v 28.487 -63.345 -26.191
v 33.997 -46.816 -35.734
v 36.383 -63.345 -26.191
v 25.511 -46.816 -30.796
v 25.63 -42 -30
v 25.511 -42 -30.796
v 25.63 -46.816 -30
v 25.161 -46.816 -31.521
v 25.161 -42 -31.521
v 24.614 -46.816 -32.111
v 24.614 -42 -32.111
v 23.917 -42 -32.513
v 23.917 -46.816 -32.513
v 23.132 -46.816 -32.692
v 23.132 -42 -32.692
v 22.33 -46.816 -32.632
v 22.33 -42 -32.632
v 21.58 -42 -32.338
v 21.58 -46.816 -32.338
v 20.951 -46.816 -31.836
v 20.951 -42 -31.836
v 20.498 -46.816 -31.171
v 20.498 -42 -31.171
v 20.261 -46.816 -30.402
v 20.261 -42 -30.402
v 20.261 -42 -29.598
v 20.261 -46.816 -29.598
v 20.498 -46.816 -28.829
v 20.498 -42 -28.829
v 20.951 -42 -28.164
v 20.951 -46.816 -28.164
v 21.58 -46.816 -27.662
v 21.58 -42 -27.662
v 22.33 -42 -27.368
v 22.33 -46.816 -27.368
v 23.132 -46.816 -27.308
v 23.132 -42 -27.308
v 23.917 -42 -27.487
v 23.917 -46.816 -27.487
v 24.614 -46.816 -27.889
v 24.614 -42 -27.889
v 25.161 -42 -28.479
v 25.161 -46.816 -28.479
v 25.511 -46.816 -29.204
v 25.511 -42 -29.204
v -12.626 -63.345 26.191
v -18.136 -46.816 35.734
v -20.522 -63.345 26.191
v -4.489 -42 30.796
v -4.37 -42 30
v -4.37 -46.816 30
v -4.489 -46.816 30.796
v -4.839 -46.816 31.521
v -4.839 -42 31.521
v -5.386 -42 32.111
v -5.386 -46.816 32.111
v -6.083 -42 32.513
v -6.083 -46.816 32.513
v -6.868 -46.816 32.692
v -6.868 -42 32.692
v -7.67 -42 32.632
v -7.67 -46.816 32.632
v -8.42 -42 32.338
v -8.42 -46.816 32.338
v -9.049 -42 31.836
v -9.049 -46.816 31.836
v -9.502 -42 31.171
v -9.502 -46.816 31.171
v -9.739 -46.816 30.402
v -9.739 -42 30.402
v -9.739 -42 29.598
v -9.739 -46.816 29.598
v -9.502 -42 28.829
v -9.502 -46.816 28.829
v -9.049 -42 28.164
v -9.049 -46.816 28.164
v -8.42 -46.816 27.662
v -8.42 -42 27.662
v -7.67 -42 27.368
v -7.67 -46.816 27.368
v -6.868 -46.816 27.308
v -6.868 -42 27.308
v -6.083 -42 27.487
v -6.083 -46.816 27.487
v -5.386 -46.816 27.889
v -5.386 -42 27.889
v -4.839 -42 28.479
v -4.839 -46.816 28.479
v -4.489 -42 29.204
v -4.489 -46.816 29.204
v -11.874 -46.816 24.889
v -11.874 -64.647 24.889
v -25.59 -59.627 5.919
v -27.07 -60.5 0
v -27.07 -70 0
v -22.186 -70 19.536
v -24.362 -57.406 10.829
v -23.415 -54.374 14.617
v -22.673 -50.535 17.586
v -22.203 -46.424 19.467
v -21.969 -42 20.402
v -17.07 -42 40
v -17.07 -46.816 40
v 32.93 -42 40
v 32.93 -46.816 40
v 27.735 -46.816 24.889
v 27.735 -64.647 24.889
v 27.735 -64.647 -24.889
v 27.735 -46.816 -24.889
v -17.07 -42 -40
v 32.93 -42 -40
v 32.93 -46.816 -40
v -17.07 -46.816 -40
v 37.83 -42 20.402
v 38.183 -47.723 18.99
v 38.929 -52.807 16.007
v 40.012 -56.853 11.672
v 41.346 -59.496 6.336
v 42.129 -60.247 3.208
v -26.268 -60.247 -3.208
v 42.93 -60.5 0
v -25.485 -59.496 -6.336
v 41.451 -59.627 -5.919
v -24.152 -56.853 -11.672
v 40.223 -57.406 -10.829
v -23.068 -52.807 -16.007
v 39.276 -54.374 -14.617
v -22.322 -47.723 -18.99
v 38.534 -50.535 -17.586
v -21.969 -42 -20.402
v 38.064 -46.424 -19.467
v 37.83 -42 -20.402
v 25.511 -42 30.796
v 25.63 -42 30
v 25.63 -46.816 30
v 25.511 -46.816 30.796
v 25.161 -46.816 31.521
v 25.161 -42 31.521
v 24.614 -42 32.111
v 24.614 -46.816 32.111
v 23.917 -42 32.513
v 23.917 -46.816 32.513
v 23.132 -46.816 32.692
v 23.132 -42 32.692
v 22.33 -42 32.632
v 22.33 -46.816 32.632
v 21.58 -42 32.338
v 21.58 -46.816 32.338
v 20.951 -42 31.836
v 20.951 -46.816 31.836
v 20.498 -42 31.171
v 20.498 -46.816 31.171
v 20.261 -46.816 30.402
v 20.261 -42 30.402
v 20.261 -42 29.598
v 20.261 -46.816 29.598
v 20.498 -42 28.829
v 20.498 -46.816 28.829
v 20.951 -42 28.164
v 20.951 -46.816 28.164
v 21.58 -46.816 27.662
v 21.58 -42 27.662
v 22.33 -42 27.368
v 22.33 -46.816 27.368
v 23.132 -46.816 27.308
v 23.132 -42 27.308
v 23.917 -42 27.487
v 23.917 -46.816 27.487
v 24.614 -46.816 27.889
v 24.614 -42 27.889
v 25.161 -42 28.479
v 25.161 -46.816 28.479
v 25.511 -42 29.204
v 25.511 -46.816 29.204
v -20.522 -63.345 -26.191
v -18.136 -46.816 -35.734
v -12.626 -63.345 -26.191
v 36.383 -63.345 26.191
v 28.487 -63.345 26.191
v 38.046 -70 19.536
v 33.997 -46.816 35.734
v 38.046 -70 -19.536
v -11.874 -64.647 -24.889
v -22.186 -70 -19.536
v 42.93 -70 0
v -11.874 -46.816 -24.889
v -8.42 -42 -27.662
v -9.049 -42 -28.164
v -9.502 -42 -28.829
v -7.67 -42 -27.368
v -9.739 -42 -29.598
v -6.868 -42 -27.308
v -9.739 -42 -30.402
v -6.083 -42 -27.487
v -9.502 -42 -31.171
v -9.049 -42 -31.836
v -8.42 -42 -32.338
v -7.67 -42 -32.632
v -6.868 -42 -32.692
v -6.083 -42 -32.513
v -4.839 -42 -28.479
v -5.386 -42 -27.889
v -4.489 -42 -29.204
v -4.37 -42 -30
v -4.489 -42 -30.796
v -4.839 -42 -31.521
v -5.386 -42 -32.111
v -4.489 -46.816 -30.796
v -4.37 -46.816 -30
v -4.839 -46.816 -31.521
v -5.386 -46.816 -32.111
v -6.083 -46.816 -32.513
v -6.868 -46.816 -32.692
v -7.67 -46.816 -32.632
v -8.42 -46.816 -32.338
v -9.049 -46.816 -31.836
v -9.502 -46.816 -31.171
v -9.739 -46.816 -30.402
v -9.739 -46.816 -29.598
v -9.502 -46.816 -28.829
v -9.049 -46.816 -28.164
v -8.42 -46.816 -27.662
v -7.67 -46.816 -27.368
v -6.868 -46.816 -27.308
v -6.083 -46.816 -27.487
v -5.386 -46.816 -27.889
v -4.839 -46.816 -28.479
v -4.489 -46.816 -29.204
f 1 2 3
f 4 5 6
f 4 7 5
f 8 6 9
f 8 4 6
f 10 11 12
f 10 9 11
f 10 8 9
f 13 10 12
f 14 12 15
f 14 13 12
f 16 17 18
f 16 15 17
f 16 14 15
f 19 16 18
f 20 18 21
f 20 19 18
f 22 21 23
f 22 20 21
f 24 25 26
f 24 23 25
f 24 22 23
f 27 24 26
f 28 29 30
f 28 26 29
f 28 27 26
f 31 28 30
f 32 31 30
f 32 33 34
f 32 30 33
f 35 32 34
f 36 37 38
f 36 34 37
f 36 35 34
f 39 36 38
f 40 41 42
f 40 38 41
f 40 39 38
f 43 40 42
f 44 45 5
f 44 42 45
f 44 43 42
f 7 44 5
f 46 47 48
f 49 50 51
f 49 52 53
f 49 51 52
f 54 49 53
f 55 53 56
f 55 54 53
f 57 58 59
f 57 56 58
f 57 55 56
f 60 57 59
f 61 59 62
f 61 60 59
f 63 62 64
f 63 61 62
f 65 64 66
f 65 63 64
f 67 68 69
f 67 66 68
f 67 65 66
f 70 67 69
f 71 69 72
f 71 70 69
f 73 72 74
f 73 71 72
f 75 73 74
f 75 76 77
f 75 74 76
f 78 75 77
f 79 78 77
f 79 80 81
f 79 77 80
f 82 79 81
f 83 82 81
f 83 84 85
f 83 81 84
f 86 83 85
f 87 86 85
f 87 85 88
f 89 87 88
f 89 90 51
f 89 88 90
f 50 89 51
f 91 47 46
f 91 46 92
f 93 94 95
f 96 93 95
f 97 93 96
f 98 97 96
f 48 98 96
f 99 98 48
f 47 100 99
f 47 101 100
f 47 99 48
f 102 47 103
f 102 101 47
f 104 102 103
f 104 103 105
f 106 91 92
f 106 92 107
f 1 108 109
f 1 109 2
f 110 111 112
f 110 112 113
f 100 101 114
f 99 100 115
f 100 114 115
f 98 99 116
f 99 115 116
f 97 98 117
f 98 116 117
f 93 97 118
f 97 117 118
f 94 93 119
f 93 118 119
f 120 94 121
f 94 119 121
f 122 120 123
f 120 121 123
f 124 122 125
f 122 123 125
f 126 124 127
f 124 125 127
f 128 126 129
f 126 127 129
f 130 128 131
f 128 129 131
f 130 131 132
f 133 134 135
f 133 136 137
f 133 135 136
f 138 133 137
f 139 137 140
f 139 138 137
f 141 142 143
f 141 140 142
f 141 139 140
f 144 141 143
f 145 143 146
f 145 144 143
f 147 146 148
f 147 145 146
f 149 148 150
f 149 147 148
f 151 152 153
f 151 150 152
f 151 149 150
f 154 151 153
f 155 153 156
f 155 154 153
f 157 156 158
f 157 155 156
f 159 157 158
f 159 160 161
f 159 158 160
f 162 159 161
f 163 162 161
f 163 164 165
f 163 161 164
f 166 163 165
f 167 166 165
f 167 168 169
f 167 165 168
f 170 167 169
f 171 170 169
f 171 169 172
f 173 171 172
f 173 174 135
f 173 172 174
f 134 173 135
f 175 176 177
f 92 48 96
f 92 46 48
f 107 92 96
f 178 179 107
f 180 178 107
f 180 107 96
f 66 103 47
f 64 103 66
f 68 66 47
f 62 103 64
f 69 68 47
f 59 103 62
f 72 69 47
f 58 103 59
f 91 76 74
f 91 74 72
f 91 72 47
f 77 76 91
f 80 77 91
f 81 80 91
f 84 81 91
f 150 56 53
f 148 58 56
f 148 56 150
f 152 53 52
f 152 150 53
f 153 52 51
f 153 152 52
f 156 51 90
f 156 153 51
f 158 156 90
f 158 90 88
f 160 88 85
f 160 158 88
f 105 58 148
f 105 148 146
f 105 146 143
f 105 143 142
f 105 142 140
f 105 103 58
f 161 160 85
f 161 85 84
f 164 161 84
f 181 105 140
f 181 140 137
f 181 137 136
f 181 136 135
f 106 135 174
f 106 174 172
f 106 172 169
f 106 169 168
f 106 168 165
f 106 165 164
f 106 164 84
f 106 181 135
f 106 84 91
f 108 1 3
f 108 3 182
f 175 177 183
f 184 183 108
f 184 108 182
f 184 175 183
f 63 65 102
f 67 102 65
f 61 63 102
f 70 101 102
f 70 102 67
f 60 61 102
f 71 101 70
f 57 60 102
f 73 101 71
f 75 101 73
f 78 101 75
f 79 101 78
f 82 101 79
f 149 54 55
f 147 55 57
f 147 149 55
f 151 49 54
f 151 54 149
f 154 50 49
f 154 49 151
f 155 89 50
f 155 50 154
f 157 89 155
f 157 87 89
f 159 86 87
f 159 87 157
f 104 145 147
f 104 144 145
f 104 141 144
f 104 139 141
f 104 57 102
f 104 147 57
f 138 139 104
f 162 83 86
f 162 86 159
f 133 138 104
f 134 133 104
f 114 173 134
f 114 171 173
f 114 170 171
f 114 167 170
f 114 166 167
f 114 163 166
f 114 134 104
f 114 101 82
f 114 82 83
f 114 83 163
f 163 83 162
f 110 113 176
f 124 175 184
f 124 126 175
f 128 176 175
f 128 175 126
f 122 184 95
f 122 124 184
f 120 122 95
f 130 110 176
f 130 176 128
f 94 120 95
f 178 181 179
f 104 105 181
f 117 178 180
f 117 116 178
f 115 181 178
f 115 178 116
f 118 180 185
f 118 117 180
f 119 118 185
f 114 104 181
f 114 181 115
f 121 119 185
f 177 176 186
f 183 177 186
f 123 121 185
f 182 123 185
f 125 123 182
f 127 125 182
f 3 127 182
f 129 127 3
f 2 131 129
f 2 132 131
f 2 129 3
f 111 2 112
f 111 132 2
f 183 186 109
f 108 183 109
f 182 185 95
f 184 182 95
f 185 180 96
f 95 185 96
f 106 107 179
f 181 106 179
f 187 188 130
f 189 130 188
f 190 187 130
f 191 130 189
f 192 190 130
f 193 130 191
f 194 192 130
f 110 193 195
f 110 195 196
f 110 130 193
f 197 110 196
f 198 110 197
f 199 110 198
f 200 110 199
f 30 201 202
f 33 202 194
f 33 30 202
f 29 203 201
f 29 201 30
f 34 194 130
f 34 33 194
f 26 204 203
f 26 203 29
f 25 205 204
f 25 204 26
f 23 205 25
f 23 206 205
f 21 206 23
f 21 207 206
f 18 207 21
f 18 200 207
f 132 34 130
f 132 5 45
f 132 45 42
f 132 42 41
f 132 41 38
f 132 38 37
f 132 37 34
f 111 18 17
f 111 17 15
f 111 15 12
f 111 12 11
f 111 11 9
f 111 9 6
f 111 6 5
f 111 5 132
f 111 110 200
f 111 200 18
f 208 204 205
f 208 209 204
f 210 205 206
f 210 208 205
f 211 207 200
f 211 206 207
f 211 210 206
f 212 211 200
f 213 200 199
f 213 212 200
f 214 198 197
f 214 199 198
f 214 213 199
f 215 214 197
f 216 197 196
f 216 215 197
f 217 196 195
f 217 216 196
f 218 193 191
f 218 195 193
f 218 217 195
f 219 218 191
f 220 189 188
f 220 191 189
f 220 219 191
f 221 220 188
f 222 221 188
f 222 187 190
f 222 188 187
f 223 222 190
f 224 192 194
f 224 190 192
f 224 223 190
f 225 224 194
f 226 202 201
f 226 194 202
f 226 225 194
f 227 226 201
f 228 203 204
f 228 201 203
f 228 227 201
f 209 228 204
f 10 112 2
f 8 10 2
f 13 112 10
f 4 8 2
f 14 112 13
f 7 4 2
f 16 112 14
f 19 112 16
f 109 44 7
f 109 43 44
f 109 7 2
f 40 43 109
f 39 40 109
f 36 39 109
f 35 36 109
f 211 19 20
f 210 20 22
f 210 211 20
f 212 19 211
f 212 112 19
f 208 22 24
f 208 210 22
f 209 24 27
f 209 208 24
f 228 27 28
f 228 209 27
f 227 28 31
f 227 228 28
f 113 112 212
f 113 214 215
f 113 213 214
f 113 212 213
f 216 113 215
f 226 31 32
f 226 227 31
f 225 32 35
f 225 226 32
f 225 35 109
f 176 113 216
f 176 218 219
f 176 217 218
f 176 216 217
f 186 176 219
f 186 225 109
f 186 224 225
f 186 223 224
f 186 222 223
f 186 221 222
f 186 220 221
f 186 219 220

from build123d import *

# Parameters (mm, degrees)
PAD004_DEPTH         = 30
SKETCH011_R          = 20.5
POCKET004_DEPTH      = 42.931486
POCKET004_DEPTH_BACK = 27.070514
POCKET005_DEPTH      = 263.838706
POCKET005_DEPTH_BACK = 247.977735
SKETCH013_R          = 2.7
POCKET006_DEPTH      = 220.90822
POCKET006_DEPTH_BACK = 250.90822
POCKET007_DEPTH      = 244.092718
SKETCH024_W          = 115.08152
SKETCH024_H          = 98.641312
POCKET017_DEPTH      = 2


with BuildPart() as part:
    # Sketch010 → Pad004 (new body)
    with BuildSketch(Plane.XZ):
        Polygon((-27.069514, 0), (-17.069514, 40), (32.930486, 40), (42.930486, 0), (32.930486, -40), (-17.069514, -40), align=None)
    extrude(amount=PAD004_DEPTH)

    # Sketch011 → Pocket004 (cut, two sides)
    with BuildSketch(Plane.YZ) as pocket004_sk:
        Circle(SKETCH011_R)
    extrude(amount=POCKET004_DEPTH, mode=Mode.SUBTRACT)
    extrude(pocket004_sk.sketch, amount=-POCKET004_DEPTH_BACK, mode=Mode.SUBTRACT)

    # Sketch012 → Pocket005 (cut, two sides)
    with BuildSketch(Plane.YZ) as pocket005_sk:
        Polygon((-36.13987, 42.447654), (-6.815503, 42.447654), (-6.815503, 35.734174), (-23.345354, 26.19066), (-36.13987, 13.396144), align=None)
    pocket005 = extrude(amount=POCKET005_DEPTH, mode=Mode.SUBTRACT) + extrude(pocket005_sk.sketch, amount=-POCKET005_DEPTH_BACK, mode=Mode.SUBTRACT)

    # Mirrored001: Pocket005 across Sketch012 H_Axis
    add(pocket005.mirror(Plane.XY), mode=Mode.SUBTRACT)

    # Sketch013 → Pocket006 (cut, two sides)
    with BuildSketch(Plane.XZ) as pocket006_sk:
        with Locations((-7.069514, 30)):
            Circle(SKETCH013_R)
        with Locations((22.930486, 30)):
            Circle(SKETCH013_R)
    pocket006 = extrude(amount=-POCKET006_DEPTH, mode=Mode.SUBTRACT) + extrude(pocket006_sk.sketch, amount=POCKET006_DEPTH_BACK, mode=Mode.SUBTRACT)

    # Mirrored002: Pocket006 across Sketch013 H_Axis
    add(pocket006.mirror(Plane(origin=(0, 0, 0), x_dir=(0, -1, 0), z_dir=(0, 0, 1))), mode=Mode.SUBTRACT)

    # Sketch014 (on Face5 of Mirrored002) → Pocket007 (cut, through all)
    with BuildSketch(Plane.XZ.offset(6.815503)):
        Polygon((-11.874352, 24.888732), (27.735323, 24.888732), (33.996942, 35.734174), (-18.135971, 35.734174), align=None)
    pocket007 = extrude(amount=POCKET007_DEPTH, mode=Mode.SUBTRACT)

    # Mirrored003: Pocket007 across Sketch014 H_Axis
    add(pocket007.mirror(Plane(origin=(0, -6.815503, 0), x_dir=(0, -1, 0), z_dir=(0, 0, 1))), mode=Mode.SUBTRACT)

    # Sketch024 (on Face12 of Mirrored003) → Pocket017 (cut)
    with BuildSketch(Plane(origin=(0, 0, 0), x_dir=(1, 0, 0), z_dir=(0, 1, 0))):
        with Locations((8.455631, -2.089874)):
            Rectangle(SKETCH024_W, SKETCH024_H)
    extrude(amount=-POCKET017_DEPTH, mode=Mode.SUBTRACT)


with BuildPart() as part_1:
    # Body003 placement: moved
    add(part.part.moved(Location((0, -40, 0))))


solid = part_1.part
